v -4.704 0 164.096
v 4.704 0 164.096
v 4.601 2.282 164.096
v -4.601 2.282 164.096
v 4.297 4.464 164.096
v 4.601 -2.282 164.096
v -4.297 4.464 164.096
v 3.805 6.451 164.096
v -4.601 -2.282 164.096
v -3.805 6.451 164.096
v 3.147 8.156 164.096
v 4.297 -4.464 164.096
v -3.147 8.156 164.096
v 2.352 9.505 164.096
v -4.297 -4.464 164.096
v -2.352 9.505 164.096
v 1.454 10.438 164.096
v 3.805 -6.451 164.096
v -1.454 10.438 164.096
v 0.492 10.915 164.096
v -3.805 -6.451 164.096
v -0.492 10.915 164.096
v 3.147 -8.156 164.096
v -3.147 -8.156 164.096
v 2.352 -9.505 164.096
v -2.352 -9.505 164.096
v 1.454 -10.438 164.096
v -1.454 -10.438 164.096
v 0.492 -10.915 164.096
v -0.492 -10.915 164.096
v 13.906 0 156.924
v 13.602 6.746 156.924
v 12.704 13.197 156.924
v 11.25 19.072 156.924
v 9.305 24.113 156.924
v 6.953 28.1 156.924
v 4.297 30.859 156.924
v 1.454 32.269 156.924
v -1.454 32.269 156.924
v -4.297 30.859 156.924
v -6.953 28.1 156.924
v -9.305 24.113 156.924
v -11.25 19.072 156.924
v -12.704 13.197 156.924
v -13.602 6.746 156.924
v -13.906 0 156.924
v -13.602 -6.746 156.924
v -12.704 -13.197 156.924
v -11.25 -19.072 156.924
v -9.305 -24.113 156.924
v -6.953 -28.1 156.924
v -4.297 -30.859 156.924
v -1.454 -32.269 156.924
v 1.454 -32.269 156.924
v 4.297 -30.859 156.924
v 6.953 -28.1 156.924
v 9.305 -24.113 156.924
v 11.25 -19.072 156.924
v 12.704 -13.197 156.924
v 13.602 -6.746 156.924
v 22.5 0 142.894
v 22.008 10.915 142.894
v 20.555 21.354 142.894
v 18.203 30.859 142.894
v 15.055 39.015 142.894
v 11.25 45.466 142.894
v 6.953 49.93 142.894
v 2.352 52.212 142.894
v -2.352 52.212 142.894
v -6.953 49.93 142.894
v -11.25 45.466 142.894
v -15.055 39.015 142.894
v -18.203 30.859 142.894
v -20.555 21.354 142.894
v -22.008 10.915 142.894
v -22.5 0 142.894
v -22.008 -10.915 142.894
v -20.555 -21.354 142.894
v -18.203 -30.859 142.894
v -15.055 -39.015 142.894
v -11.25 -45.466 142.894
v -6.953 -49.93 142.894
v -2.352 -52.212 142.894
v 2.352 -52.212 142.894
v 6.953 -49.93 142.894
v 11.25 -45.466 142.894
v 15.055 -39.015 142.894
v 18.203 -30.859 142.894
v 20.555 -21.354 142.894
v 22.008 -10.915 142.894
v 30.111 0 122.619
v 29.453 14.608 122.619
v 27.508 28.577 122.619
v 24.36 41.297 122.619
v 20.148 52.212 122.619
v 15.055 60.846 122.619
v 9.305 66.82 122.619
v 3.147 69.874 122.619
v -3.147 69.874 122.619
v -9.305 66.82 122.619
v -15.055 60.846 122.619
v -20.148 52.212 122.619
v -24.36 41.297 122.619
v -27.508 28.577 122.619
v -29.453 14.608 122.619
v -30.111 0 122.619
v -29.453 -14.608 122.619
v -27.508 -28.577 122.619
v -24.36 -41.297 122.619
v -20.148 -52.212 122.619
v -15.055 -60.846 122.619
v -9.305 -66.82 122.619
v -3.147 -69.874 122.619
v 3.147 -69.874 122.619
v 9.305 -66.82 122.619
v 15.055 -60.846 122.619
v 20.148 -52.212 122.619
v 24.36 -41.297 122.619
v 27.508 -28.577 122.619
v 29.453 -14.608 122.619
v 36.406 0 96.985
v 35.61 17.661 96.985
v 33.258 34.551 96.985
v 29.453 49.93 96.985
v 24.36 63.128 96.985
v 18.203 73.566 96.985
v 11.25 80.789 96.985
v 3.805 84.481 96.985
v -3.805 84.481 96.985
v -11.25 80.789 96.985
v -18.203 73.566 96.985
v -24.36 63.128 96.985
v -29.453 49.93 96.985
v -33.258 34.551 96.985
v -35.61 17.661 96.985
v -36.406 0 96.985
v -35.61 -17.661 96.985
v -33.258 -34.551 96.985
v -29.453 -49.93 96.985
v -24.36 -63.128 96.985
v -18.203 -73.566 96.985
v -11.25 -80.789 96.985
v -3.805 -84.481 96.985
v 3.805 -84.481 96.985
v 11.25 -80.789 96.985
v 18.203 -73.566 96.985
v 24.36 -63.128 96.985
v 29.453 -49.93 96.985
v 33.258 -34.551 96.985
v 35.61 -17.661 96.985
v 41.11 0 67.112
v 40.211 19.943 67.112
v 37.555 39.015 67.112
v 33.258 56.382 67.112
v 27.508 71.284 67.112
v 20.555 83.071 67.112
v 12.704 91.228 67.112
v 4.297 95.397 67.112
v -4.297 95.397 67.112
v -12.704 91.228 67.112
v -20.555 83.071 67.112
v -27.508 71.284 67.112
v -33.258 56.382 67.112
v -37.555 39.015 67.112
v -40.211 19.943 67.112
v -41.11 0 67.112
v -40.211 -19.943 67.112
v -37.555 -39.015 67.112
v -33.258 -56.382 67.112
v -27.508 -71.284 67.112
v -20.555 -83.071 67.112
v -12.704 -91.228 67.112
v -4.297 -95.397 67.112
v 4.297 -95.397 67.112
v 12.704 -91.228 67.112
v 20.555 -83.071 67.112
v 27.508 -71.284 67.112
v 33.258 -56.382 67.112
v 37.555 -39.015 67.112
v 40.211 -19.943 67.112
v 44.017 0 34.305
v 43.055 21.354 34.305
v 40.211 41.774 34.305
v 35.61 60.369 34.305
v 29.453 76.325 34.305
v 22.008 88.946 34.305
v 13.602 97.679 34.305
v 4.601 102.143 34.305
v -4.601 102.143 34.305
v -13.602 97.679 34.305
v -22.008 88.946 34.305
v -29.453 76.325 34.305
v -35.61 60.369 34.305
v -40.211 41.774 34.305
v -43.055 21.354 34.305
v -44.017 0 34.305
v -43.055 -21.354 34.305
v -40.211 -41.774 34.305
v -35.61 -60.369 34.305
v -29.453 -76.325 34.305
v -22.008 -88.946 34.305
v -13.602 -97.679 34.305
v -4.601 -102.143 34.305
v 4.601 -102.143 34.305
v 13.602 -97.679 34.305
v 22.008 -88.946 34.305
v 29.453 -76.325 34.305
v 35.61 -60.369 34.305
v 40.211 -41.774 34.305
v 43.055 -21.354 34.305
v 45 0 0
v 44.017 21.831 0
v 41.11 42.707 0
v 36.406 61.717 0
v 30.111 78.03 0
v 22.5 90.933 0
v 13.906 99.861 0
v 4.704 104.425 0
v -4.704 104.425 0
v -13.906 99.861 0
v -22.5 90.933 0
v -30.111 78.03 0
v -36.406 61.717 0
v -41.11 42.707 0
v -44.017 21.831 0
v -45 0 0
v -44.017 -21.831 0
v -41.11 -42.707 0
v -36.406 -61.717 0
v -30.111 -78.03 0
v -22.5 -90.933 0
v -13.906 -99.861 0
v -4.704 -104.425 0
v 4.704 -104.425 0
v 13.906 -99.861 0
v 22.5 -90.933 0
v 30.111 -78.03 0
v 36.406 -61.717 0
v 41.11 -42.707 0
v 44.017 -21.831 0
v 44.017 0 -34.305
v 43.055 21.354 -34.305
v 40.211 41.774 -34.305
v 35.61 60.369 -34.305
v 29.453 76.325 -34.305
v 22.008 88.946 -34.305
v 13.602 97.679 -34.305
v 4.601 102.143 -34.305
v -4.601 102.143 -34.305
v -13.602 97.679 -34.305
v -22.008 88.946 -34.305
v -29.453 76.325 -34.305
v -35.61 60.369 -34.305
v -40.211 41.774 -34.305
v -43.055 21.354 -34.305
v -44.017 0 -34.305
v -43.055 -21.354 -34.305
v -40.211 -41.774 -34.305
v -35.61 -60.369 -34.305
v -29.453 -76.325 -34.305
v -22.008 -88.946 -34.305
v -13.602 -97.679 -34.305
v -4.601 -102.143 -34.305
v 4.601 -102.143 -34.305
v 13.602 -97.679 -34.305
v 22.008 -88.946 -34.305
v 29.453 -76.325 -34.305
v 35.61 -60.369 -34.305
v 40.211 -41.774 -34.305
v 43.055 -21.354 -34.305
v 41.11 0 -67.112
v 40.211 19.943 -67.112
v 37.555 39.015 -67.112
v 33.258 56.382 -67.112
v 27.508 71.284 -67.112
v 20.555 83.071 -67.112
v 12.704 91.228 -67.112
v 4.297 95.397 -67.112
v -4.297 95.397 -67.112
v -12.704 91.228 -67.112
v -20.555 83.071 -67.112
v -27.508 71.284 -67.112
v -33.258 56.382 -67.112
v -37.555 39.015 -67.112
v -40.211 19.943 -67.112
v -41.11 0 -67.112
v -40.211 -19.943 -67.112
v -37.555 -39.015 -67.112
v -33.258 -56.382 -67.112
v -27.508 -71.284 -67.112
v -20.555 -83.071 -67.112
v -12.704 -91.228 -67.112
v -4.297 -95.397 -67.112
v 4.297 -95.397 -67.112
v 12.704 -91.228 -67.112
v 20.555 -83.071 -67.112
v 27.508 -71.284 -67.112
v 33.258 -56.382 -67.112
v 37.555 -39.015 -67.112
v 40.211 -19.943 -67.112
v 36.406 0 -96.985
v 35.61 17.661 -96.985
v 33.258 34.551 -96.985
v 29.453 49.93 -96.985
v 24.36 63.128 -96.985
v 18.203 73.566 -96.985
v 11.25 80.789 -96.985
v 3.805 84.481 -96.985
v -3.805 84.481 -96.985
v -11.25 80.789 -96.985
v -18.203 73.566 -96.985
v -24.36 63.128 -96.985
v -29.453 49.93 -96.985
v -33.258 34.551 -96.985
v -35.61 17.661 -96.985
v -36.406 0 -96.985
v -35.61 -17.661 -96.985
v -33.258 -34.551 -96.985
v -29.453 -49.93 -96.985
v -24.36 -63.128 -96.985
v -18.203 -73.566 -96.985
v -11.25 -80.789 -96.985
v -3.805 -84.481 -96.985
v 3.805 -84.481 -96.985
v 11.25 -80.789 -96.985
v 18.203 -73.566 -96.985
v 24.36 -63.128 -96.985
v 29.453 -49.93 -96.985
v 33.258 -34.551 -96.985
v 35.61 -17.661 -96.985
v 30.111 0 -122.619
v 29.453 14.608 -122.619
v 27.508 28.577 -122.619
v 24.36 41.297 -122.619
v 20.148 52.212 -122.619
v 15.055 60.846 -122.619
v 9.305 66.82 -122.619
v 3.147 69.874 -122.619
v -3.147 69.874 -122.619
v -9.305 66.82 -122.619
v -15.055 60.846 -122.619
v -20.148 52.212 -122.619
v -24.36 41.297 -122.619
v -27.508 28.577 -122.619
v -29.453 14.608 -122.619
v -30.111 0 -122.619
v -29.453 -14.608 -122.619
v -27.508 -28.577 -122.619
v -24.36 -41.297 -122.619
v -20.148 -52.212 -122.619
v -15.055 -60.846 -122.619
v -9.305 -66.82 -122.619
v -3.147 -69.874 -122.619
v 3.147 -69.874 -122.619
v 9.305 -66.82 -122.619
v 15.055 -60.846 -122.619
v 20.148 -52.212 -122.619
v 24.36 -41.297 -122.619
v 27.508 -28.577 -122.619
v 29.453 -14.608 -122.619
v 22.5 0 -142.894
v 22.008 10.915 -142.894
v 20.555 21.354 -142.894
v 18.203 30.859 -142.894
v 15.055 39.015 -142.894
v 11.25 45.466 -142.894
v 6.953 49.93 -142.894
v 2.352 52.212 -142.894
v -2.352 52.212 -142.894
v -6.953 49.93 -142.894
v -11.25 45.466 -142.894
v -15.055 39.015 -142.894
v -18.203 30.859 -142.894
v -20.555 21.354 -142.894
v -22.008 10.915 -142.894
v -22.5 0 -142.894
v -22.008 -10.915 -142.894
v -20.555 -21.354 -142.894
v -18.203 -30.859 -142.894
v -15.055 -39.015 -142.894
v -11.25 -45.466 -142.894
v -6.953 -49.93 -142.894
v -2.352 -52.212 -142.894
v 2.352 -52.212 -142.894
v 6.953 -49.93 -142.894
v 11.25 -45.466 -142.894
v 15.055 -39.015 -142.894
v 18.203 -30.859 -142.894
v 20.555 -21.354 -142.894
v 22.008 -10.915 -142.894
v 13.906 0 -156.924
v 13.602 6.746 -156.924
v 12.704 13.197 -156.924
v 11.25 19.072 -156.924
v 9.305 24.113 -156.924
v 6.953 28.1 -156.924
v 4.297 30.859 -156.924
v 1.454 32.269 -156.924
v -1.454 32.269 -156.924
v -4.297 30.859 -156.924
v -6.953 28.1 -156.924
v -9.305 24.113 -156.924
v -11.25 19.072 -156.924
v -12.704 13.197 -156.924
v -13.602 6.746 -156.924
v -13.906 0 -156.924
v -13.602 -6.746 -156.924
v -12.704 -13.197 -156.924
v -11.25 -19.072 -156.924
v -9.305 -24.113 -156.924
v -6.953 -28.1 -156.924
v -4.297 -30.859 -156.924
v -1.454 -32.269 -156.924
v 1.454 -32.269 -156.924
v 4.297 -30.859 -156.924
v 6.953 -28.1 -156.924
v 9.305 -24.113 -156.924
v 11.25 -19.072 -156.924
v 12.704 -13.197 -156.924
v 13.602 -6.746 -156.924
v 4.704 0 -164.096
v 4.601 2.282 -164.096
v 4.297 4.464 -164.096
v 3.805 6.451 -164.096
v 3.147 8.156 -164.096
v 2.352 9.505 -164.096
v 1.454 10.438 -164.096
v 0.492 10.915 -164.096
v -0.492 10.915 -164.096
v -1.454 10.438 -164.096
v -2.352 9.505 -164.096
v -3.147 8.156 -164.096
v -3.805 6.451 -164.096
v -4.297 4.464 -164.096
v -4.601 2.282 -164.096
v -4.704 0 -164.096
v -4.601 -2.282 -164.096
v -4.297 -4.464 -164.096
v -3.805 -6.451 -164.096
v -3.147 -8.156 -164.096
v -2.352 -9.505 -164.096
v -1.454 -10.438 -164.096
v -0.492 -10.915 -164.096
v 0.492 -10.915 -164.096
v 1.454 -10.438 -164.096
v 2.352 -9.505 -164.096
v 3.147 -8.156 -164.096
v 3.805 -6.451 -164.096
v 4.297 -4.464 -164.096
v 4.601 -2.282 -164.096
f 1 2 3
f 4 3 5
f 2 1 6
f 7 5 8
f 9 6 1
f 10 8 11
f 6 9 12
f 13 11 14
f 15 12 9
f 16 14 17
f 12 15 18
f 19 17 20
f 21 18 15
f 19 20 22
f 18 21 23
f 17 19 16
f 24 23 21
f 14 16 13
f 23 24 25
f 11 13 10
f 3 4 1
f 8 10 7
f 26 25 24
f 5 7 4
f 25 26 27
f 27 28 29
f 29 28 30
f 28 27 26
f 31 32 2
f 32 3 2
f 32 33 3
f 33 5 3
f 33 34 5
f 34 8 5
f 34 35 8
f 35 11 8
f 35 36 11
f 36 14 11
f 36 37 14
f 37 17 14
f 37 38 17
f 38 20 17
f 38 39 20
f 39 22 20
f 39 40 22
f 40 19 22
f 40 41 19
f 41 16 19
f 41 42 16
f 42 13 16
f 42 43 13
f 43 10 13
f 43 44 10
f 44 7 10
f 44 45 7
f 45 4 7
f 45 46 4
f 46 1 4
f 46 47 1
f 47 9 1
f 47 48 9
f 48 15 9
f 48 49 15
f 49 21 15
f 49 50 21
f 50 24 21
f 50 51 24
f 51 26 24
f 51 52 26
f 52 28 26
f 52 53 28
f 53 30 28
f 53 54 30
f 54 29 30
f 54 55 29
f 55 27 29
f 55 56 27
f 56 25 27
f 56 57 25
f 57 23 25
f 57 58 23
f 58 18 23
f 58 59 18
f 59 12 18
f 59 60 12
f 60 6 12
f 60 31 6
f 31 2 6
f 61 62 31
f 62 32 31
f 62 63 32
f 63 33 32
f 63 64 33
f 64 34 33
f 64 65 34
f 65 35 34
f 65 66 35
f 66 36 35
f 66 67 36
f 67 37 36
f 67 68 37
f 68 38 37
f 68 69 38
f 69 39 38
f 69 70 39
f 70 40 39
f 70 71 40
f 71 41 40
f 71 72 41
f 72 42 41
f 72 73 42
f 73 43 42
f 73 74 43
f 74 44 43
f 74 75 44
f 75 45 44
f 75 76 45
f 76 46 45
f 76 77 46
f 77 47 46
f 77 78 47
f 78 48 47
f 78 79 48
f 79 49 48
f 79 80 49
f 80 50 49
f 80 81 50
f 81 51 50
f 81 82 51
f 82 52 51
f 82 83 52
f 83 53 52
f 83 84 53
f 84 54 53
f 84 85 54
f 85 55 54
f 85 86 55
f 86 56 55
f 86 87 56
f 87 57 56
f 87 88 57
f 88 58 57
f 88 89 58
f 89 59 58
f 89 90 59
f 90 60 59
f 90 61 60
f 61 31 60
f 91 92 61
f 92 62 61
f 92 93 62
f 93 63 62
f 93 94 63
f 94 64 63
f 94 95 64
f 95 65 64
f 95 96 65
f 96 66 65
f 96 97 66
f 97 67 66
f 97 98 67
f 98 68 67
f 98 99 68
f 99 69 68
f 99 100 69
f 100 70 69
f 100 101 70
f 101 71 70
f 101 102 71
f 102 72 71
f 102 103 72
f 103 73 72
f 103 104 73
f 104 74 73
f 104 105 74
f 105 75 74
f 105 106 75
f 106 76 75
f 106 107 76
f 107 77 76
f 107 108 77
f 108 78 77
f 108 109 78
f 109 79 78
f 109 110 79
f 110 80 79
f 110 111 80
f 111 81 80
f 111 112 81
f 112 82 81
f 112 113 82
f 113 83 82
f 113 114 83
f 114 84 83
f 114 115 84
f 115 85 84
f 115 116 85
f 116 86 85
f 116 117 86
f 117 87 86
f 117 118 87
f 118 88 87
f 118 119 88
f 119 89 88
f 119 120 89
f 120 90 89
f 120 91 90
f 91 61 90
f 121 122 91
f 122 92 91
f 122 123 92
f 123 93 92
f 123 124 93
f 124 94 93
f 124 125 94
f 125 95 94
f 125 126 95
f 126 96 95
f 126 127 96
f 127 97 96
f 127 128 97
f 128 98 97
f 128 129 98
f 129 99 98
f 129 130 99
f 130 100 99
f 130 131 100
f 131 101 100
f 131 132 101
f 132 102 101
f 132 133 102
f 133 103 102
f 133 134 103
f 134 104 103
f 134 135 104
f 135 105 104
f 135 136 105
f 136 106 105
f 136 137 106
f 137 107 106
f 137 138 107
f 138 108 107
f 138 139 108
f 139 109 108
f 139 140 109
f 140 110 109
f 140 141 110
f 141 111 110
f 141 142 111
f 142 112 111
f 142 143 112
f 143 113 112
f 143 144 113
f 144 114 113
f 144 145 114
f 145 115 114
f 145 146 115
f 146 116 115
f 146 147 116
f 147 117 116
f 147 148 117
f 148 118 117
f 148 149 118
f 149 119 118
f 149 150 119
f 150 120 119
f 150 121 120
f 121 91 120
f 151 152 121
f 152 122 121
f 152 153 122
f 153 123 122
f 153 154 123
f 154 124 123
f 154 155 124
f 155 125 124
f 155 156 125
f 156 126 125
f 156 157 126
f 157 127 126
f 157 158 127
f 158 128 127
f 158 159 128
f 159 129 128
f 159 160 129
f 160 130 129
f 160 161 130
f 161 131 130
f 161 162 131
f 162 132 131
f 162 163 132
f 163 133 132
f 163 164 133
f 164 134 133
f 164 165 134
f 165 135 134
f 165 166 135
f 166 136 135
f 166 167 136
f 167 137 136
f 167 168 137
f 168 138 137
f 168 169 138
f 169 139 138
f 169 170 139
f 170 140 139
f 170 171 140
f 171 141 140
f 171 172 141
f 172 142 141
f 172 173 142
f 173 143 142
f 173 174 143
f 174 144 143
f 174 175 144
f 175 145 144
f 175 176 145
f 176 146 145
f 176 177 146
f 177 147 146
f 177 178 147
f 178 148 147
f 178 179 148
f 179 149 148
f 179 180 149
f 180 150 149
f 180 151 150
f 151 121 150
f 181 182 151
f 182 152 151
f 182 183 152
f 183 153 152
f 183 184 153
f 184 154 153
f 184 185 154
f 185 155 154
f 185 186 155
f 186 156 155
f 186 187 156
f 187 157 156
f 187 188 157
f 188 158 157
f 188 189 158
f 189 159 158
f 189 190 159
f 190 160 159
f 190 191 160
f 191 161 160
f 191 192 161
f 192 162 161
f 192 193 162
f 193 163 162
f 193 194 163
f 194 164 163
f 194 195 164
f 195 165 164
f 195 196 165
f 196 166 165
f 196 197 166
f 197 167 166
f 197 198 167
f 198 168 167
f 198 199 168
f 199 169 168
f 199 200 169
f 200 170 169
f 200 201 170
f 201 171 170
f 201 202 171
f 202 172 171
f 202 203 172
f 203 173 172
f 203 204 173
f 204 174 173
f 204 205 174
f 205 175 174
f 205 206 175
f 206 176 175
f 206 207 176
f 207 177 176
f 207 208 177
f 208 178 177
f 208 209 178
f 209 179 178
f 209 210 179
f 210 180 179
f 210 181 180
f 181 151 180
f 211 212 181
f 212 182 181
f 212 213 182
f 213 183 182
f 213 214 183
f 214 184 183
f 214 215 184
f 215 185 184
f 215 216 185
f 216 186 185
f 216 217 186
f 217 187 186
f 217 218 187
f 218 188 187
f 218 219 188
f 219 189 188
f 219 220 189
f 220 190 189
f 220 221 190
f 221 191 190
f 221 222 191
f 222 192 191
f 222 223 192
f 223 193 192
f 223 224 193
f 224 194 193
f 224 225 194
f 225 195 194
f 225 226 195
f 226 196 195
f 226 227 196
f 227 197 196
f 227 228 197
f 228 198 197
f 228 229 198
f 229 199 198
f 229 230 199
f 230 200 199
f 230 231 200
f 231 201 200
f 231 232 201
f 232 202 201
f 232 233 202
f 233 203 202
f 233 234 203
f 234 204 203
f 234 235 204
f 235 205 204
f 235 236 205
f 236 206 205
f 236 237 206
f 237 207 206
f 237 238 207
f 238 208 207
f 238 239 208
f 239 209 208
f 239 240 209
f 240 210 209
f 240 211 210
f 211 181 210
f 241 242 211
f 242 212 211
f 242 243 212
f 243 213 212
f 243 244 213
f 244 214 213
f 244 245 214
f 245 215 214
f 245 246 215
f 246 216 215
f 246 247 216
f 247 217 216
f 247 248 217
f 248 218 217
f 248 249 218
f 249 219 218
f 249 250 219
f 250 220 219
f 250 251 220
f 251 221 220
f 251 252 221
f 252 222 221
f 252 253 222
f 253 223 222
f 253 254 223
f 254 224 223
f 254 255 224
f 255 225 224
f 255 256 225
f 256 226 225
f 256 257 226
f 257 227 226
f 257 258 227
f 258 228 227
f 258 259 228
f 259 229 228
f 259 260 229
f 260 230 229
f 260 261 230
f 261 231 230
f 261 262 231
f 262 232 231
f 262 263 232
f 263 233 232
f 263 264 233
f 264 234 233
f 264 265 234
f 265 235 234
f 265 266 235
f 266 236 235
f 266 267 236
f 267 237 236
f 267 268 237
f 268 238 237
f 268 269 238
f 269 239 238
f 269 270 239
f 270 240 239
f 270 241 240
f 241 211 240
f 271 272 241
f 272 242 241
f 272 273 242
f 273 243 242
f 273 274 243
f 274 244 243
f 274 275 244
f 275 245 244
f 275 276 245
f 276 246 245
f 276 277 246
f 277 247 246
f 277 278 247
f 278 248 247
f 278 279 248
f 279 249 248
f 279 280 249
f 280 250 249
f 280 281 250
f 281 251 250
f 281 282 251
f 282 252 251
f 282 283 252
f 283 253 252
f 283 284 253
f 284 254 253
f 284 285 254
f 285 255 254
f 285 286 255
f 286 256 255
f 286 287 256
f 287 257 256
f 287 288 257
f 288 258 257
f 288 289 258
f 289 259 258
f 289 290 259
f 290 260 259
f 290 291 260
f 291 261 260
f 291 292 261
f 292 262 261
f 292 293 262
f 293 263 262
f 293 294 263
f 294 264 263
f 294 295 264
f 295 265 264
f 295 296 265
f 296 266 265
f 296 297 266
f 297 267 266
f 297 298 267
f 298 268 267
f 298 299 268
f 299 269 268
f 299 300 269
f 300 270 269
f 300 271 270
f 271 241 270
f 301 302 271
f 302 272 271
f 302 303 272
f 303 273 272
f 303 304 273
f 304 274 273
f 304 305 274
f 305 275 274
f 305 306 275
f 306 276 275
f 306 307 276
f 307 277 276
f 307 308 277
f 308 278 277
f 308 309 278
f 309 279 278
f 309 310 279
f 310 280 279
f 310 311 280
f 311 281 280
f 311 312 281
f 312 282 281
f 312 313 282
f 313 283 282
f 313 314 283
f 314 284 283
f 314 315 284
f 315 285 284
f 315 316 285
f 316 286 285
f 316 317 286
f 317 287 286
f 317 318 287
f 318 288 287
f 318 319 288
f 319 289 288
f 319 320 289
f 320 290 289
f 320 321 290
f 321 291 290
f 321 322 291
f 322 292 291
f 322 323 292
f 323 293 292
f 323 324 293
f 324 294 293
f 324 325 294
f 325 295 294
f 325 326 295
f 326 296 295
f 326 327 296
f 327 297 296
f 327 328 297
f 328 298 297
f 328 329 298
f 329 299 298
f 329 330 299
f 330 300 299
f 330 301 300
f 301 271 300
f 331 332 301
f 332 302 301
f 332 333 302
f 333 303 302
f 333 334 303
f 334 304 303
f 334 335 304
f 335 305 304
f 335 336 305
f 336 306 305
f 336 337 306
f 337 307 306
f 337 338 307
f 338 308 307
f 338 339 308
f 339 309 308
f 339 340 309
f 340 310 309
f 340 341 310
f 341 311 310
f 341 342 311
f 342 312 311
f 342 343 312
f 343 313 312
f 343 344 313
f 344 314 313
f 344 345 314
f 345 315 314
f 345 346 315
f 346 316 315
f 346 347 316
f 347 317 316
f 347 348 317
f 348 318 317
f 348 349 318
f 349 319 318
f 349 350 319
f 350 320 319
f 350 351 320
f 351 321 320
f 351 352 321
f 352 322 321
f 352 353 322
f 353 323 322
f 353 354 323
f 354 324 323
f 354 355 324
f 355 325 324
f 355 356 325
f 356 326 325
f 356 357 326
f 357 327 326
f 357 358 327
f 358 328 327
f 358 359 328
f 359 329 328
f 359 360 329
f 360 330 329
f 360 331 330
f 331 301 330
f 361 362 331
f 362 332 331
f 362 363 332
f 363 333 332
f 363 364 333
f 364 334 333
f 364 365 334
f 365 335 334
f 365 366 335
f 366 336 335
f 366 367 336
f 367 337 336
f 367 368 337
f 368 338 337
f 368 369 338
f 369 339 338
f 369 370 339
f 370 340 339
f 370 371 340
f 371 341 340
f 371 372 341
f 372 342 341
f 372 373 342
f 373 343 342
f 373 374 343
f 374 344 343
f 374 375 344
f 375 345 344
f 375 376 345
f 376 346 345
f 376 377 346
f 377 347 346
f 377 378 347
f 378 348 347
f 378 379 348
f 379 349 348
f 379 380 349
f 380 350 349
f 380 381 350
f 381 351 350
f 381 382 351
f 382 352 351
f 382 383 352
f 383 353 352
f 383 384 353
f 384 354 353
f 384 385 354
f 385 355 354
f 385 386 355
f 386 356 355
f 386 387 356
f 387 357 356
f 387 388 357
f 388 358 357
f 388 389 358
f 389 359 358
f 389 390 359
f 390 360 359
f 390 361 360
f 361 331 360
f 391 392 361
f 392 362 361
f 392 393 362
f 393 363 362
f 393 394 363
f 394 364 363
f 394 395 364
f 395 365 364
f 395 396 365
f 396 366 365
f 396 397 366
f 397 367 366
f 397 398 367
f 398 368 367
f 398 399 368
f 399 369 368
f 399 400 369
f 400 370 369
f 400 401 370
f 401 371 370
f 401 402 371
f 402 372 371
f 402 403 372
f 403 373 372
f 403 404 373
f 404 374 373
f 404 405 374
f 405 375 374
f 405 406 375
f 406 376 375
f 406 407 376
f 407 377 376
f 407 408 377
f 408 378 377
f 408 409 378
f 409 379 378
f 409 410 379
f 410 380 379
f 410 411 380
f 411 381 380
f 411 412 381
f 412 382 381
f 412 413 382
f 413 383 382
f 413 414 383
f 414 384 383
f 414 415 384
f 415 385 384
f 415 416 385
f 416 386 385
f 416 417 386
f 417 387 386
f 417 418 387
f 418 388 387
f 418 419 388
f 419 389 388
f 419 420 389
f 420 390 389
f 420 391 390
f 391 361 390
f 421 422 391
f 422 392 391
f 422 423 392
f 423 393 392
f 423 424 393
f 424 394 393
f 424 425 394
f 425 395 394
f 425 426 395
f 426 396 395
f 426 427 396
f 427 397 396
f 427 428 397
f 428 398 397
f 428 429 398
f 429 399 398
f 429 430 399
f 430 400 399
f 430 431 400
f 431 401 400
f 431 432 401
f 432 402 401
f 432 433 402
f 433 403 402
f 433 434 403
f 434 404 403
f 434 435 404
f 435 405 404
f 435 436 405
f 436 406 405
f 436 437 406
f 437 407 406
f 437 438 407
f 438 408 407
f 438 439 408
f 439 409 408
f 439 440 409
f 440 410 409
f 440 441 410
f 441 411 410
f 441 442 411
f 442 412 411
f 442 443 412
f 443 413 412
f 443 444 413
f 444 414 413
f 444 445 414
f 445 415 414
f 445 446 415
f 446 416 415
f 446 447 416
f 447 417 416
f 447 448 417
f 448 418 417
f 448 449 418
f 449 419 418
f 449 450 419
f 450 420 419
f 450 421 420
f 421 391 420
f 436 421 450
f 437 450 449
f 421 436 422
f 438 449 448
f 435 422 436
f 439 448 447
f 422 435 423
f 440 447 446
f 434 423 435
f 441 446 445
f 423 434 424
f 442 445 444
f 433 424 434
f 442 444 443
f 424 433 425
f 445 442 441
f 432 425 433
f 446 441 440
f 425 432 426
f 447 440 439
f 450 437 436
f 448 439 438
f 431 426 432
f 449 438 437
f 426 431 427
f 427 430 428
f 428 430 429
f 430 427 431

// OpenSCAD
// Generated by SolidPython 1.0.1 on 2020-07-29 00:46:45


scale(v = [3, 7, 11]) {
	sphere(r = 15);
}
/***********************************************
*********      SolidPython code:      **********
************************************************
 
# import packages: SolidPython
from solid import *
from solid.utils import *
from itertools import chain, combinations, permutations


class Resize:

    def __init__(self, scad_file):
        self.scad_file = scad_file
        #self.scad_file = import_scad(scad_file)
        # cone/cylinder param:
        self.r1 = 0
        self.r2 = 0
        self.h = 0
        # rectangular prism param:
        self.w = 0
        self.l = 0
        # ellipse param:
        self.r = 0

    # import OpenScad code (file name corresponds to shape)


    # classify shape + parameters
    def assign(self, param1, param2, param3):
        if self.scad_file == 'cone.scad':
            self.r1 = param1
            self.r2 = param2
            self.h = param3
        elif self.scad_file == 'cylinder.scad':
            self.r1 = param1
            self.r2 = param2
            self.h = param3
        elif self.scad_file == 'rectangularPrism.scad':
            self.h = param1
            self.l = param2
            self.w = param3
        else:
            self.r = param1
            self.h = param2

    # resize parameters
    def iterate(self):
        x = range(3, 20, 2)
        i = 1
        if self.scad_file == 'cone.scad':
            tempList = list(permutations(x, 2))
            for temp in tempList:
                param1 = temp[0]
                param2 = temp[1]
                filepath = 'produced_scad_files/' + 'cone' + str(param1) + '_' + str(param2) + '_' + '.scad'
                scad_render_to_file(cylinder(h=param1, r1=param2, r2=0), filepath)

        elif self.scad_file == 'cylinder.scad':
            tempList = list(permutations(x, 3))
            for temp in tempList:
                param1 = temp[0]
                param2 = temp[1]
                filepath = 'produced_scad_files/' + 'cylinder' + str(param1) + '_' + str(param2) + '_' + '.scad'
                scad_render_to_file(cylinder(h=param1, r1=param2, r2=param2), filepath)

        elif self.scad_file == 'rectangularPrism.scad':
            tempList = list(permutations(x, 3))
            for temp in tempList:
                param1 = temp[0]
                param2 = temp[1]
                param3 = temp[2]
                filepath = 'produced_scad_files/' + 'rectangularPrism' + str(param1) + '_' + str(param2) + '_' + str(
                    param3) + '.scad'
                scad_render_to_file(cube(size=(param1, param2, param3)), filepath)

        elif self.scad_file == 'ellipse.scad':
            tempList = list(permutations(x, 4))
            for temp in tempList:
                param1 = temp[0]
                param2 = temp[1]
                param3 = temp[2]
                param4 = temp[3]
                filepath = 'produced_scad_files/' + 'ellipse' + str(param1) + '_' + str(param2) + '_' + str(param3) + '_' + str(param4) + '.scad'
                scad_render_to_file(scale([param1, param2, param3])(sphere(r=param4)), filepath)

    def render_to_scadfile(self):
        scad_render_to_file(scad, 'example.scad') 
 
************************************************/
